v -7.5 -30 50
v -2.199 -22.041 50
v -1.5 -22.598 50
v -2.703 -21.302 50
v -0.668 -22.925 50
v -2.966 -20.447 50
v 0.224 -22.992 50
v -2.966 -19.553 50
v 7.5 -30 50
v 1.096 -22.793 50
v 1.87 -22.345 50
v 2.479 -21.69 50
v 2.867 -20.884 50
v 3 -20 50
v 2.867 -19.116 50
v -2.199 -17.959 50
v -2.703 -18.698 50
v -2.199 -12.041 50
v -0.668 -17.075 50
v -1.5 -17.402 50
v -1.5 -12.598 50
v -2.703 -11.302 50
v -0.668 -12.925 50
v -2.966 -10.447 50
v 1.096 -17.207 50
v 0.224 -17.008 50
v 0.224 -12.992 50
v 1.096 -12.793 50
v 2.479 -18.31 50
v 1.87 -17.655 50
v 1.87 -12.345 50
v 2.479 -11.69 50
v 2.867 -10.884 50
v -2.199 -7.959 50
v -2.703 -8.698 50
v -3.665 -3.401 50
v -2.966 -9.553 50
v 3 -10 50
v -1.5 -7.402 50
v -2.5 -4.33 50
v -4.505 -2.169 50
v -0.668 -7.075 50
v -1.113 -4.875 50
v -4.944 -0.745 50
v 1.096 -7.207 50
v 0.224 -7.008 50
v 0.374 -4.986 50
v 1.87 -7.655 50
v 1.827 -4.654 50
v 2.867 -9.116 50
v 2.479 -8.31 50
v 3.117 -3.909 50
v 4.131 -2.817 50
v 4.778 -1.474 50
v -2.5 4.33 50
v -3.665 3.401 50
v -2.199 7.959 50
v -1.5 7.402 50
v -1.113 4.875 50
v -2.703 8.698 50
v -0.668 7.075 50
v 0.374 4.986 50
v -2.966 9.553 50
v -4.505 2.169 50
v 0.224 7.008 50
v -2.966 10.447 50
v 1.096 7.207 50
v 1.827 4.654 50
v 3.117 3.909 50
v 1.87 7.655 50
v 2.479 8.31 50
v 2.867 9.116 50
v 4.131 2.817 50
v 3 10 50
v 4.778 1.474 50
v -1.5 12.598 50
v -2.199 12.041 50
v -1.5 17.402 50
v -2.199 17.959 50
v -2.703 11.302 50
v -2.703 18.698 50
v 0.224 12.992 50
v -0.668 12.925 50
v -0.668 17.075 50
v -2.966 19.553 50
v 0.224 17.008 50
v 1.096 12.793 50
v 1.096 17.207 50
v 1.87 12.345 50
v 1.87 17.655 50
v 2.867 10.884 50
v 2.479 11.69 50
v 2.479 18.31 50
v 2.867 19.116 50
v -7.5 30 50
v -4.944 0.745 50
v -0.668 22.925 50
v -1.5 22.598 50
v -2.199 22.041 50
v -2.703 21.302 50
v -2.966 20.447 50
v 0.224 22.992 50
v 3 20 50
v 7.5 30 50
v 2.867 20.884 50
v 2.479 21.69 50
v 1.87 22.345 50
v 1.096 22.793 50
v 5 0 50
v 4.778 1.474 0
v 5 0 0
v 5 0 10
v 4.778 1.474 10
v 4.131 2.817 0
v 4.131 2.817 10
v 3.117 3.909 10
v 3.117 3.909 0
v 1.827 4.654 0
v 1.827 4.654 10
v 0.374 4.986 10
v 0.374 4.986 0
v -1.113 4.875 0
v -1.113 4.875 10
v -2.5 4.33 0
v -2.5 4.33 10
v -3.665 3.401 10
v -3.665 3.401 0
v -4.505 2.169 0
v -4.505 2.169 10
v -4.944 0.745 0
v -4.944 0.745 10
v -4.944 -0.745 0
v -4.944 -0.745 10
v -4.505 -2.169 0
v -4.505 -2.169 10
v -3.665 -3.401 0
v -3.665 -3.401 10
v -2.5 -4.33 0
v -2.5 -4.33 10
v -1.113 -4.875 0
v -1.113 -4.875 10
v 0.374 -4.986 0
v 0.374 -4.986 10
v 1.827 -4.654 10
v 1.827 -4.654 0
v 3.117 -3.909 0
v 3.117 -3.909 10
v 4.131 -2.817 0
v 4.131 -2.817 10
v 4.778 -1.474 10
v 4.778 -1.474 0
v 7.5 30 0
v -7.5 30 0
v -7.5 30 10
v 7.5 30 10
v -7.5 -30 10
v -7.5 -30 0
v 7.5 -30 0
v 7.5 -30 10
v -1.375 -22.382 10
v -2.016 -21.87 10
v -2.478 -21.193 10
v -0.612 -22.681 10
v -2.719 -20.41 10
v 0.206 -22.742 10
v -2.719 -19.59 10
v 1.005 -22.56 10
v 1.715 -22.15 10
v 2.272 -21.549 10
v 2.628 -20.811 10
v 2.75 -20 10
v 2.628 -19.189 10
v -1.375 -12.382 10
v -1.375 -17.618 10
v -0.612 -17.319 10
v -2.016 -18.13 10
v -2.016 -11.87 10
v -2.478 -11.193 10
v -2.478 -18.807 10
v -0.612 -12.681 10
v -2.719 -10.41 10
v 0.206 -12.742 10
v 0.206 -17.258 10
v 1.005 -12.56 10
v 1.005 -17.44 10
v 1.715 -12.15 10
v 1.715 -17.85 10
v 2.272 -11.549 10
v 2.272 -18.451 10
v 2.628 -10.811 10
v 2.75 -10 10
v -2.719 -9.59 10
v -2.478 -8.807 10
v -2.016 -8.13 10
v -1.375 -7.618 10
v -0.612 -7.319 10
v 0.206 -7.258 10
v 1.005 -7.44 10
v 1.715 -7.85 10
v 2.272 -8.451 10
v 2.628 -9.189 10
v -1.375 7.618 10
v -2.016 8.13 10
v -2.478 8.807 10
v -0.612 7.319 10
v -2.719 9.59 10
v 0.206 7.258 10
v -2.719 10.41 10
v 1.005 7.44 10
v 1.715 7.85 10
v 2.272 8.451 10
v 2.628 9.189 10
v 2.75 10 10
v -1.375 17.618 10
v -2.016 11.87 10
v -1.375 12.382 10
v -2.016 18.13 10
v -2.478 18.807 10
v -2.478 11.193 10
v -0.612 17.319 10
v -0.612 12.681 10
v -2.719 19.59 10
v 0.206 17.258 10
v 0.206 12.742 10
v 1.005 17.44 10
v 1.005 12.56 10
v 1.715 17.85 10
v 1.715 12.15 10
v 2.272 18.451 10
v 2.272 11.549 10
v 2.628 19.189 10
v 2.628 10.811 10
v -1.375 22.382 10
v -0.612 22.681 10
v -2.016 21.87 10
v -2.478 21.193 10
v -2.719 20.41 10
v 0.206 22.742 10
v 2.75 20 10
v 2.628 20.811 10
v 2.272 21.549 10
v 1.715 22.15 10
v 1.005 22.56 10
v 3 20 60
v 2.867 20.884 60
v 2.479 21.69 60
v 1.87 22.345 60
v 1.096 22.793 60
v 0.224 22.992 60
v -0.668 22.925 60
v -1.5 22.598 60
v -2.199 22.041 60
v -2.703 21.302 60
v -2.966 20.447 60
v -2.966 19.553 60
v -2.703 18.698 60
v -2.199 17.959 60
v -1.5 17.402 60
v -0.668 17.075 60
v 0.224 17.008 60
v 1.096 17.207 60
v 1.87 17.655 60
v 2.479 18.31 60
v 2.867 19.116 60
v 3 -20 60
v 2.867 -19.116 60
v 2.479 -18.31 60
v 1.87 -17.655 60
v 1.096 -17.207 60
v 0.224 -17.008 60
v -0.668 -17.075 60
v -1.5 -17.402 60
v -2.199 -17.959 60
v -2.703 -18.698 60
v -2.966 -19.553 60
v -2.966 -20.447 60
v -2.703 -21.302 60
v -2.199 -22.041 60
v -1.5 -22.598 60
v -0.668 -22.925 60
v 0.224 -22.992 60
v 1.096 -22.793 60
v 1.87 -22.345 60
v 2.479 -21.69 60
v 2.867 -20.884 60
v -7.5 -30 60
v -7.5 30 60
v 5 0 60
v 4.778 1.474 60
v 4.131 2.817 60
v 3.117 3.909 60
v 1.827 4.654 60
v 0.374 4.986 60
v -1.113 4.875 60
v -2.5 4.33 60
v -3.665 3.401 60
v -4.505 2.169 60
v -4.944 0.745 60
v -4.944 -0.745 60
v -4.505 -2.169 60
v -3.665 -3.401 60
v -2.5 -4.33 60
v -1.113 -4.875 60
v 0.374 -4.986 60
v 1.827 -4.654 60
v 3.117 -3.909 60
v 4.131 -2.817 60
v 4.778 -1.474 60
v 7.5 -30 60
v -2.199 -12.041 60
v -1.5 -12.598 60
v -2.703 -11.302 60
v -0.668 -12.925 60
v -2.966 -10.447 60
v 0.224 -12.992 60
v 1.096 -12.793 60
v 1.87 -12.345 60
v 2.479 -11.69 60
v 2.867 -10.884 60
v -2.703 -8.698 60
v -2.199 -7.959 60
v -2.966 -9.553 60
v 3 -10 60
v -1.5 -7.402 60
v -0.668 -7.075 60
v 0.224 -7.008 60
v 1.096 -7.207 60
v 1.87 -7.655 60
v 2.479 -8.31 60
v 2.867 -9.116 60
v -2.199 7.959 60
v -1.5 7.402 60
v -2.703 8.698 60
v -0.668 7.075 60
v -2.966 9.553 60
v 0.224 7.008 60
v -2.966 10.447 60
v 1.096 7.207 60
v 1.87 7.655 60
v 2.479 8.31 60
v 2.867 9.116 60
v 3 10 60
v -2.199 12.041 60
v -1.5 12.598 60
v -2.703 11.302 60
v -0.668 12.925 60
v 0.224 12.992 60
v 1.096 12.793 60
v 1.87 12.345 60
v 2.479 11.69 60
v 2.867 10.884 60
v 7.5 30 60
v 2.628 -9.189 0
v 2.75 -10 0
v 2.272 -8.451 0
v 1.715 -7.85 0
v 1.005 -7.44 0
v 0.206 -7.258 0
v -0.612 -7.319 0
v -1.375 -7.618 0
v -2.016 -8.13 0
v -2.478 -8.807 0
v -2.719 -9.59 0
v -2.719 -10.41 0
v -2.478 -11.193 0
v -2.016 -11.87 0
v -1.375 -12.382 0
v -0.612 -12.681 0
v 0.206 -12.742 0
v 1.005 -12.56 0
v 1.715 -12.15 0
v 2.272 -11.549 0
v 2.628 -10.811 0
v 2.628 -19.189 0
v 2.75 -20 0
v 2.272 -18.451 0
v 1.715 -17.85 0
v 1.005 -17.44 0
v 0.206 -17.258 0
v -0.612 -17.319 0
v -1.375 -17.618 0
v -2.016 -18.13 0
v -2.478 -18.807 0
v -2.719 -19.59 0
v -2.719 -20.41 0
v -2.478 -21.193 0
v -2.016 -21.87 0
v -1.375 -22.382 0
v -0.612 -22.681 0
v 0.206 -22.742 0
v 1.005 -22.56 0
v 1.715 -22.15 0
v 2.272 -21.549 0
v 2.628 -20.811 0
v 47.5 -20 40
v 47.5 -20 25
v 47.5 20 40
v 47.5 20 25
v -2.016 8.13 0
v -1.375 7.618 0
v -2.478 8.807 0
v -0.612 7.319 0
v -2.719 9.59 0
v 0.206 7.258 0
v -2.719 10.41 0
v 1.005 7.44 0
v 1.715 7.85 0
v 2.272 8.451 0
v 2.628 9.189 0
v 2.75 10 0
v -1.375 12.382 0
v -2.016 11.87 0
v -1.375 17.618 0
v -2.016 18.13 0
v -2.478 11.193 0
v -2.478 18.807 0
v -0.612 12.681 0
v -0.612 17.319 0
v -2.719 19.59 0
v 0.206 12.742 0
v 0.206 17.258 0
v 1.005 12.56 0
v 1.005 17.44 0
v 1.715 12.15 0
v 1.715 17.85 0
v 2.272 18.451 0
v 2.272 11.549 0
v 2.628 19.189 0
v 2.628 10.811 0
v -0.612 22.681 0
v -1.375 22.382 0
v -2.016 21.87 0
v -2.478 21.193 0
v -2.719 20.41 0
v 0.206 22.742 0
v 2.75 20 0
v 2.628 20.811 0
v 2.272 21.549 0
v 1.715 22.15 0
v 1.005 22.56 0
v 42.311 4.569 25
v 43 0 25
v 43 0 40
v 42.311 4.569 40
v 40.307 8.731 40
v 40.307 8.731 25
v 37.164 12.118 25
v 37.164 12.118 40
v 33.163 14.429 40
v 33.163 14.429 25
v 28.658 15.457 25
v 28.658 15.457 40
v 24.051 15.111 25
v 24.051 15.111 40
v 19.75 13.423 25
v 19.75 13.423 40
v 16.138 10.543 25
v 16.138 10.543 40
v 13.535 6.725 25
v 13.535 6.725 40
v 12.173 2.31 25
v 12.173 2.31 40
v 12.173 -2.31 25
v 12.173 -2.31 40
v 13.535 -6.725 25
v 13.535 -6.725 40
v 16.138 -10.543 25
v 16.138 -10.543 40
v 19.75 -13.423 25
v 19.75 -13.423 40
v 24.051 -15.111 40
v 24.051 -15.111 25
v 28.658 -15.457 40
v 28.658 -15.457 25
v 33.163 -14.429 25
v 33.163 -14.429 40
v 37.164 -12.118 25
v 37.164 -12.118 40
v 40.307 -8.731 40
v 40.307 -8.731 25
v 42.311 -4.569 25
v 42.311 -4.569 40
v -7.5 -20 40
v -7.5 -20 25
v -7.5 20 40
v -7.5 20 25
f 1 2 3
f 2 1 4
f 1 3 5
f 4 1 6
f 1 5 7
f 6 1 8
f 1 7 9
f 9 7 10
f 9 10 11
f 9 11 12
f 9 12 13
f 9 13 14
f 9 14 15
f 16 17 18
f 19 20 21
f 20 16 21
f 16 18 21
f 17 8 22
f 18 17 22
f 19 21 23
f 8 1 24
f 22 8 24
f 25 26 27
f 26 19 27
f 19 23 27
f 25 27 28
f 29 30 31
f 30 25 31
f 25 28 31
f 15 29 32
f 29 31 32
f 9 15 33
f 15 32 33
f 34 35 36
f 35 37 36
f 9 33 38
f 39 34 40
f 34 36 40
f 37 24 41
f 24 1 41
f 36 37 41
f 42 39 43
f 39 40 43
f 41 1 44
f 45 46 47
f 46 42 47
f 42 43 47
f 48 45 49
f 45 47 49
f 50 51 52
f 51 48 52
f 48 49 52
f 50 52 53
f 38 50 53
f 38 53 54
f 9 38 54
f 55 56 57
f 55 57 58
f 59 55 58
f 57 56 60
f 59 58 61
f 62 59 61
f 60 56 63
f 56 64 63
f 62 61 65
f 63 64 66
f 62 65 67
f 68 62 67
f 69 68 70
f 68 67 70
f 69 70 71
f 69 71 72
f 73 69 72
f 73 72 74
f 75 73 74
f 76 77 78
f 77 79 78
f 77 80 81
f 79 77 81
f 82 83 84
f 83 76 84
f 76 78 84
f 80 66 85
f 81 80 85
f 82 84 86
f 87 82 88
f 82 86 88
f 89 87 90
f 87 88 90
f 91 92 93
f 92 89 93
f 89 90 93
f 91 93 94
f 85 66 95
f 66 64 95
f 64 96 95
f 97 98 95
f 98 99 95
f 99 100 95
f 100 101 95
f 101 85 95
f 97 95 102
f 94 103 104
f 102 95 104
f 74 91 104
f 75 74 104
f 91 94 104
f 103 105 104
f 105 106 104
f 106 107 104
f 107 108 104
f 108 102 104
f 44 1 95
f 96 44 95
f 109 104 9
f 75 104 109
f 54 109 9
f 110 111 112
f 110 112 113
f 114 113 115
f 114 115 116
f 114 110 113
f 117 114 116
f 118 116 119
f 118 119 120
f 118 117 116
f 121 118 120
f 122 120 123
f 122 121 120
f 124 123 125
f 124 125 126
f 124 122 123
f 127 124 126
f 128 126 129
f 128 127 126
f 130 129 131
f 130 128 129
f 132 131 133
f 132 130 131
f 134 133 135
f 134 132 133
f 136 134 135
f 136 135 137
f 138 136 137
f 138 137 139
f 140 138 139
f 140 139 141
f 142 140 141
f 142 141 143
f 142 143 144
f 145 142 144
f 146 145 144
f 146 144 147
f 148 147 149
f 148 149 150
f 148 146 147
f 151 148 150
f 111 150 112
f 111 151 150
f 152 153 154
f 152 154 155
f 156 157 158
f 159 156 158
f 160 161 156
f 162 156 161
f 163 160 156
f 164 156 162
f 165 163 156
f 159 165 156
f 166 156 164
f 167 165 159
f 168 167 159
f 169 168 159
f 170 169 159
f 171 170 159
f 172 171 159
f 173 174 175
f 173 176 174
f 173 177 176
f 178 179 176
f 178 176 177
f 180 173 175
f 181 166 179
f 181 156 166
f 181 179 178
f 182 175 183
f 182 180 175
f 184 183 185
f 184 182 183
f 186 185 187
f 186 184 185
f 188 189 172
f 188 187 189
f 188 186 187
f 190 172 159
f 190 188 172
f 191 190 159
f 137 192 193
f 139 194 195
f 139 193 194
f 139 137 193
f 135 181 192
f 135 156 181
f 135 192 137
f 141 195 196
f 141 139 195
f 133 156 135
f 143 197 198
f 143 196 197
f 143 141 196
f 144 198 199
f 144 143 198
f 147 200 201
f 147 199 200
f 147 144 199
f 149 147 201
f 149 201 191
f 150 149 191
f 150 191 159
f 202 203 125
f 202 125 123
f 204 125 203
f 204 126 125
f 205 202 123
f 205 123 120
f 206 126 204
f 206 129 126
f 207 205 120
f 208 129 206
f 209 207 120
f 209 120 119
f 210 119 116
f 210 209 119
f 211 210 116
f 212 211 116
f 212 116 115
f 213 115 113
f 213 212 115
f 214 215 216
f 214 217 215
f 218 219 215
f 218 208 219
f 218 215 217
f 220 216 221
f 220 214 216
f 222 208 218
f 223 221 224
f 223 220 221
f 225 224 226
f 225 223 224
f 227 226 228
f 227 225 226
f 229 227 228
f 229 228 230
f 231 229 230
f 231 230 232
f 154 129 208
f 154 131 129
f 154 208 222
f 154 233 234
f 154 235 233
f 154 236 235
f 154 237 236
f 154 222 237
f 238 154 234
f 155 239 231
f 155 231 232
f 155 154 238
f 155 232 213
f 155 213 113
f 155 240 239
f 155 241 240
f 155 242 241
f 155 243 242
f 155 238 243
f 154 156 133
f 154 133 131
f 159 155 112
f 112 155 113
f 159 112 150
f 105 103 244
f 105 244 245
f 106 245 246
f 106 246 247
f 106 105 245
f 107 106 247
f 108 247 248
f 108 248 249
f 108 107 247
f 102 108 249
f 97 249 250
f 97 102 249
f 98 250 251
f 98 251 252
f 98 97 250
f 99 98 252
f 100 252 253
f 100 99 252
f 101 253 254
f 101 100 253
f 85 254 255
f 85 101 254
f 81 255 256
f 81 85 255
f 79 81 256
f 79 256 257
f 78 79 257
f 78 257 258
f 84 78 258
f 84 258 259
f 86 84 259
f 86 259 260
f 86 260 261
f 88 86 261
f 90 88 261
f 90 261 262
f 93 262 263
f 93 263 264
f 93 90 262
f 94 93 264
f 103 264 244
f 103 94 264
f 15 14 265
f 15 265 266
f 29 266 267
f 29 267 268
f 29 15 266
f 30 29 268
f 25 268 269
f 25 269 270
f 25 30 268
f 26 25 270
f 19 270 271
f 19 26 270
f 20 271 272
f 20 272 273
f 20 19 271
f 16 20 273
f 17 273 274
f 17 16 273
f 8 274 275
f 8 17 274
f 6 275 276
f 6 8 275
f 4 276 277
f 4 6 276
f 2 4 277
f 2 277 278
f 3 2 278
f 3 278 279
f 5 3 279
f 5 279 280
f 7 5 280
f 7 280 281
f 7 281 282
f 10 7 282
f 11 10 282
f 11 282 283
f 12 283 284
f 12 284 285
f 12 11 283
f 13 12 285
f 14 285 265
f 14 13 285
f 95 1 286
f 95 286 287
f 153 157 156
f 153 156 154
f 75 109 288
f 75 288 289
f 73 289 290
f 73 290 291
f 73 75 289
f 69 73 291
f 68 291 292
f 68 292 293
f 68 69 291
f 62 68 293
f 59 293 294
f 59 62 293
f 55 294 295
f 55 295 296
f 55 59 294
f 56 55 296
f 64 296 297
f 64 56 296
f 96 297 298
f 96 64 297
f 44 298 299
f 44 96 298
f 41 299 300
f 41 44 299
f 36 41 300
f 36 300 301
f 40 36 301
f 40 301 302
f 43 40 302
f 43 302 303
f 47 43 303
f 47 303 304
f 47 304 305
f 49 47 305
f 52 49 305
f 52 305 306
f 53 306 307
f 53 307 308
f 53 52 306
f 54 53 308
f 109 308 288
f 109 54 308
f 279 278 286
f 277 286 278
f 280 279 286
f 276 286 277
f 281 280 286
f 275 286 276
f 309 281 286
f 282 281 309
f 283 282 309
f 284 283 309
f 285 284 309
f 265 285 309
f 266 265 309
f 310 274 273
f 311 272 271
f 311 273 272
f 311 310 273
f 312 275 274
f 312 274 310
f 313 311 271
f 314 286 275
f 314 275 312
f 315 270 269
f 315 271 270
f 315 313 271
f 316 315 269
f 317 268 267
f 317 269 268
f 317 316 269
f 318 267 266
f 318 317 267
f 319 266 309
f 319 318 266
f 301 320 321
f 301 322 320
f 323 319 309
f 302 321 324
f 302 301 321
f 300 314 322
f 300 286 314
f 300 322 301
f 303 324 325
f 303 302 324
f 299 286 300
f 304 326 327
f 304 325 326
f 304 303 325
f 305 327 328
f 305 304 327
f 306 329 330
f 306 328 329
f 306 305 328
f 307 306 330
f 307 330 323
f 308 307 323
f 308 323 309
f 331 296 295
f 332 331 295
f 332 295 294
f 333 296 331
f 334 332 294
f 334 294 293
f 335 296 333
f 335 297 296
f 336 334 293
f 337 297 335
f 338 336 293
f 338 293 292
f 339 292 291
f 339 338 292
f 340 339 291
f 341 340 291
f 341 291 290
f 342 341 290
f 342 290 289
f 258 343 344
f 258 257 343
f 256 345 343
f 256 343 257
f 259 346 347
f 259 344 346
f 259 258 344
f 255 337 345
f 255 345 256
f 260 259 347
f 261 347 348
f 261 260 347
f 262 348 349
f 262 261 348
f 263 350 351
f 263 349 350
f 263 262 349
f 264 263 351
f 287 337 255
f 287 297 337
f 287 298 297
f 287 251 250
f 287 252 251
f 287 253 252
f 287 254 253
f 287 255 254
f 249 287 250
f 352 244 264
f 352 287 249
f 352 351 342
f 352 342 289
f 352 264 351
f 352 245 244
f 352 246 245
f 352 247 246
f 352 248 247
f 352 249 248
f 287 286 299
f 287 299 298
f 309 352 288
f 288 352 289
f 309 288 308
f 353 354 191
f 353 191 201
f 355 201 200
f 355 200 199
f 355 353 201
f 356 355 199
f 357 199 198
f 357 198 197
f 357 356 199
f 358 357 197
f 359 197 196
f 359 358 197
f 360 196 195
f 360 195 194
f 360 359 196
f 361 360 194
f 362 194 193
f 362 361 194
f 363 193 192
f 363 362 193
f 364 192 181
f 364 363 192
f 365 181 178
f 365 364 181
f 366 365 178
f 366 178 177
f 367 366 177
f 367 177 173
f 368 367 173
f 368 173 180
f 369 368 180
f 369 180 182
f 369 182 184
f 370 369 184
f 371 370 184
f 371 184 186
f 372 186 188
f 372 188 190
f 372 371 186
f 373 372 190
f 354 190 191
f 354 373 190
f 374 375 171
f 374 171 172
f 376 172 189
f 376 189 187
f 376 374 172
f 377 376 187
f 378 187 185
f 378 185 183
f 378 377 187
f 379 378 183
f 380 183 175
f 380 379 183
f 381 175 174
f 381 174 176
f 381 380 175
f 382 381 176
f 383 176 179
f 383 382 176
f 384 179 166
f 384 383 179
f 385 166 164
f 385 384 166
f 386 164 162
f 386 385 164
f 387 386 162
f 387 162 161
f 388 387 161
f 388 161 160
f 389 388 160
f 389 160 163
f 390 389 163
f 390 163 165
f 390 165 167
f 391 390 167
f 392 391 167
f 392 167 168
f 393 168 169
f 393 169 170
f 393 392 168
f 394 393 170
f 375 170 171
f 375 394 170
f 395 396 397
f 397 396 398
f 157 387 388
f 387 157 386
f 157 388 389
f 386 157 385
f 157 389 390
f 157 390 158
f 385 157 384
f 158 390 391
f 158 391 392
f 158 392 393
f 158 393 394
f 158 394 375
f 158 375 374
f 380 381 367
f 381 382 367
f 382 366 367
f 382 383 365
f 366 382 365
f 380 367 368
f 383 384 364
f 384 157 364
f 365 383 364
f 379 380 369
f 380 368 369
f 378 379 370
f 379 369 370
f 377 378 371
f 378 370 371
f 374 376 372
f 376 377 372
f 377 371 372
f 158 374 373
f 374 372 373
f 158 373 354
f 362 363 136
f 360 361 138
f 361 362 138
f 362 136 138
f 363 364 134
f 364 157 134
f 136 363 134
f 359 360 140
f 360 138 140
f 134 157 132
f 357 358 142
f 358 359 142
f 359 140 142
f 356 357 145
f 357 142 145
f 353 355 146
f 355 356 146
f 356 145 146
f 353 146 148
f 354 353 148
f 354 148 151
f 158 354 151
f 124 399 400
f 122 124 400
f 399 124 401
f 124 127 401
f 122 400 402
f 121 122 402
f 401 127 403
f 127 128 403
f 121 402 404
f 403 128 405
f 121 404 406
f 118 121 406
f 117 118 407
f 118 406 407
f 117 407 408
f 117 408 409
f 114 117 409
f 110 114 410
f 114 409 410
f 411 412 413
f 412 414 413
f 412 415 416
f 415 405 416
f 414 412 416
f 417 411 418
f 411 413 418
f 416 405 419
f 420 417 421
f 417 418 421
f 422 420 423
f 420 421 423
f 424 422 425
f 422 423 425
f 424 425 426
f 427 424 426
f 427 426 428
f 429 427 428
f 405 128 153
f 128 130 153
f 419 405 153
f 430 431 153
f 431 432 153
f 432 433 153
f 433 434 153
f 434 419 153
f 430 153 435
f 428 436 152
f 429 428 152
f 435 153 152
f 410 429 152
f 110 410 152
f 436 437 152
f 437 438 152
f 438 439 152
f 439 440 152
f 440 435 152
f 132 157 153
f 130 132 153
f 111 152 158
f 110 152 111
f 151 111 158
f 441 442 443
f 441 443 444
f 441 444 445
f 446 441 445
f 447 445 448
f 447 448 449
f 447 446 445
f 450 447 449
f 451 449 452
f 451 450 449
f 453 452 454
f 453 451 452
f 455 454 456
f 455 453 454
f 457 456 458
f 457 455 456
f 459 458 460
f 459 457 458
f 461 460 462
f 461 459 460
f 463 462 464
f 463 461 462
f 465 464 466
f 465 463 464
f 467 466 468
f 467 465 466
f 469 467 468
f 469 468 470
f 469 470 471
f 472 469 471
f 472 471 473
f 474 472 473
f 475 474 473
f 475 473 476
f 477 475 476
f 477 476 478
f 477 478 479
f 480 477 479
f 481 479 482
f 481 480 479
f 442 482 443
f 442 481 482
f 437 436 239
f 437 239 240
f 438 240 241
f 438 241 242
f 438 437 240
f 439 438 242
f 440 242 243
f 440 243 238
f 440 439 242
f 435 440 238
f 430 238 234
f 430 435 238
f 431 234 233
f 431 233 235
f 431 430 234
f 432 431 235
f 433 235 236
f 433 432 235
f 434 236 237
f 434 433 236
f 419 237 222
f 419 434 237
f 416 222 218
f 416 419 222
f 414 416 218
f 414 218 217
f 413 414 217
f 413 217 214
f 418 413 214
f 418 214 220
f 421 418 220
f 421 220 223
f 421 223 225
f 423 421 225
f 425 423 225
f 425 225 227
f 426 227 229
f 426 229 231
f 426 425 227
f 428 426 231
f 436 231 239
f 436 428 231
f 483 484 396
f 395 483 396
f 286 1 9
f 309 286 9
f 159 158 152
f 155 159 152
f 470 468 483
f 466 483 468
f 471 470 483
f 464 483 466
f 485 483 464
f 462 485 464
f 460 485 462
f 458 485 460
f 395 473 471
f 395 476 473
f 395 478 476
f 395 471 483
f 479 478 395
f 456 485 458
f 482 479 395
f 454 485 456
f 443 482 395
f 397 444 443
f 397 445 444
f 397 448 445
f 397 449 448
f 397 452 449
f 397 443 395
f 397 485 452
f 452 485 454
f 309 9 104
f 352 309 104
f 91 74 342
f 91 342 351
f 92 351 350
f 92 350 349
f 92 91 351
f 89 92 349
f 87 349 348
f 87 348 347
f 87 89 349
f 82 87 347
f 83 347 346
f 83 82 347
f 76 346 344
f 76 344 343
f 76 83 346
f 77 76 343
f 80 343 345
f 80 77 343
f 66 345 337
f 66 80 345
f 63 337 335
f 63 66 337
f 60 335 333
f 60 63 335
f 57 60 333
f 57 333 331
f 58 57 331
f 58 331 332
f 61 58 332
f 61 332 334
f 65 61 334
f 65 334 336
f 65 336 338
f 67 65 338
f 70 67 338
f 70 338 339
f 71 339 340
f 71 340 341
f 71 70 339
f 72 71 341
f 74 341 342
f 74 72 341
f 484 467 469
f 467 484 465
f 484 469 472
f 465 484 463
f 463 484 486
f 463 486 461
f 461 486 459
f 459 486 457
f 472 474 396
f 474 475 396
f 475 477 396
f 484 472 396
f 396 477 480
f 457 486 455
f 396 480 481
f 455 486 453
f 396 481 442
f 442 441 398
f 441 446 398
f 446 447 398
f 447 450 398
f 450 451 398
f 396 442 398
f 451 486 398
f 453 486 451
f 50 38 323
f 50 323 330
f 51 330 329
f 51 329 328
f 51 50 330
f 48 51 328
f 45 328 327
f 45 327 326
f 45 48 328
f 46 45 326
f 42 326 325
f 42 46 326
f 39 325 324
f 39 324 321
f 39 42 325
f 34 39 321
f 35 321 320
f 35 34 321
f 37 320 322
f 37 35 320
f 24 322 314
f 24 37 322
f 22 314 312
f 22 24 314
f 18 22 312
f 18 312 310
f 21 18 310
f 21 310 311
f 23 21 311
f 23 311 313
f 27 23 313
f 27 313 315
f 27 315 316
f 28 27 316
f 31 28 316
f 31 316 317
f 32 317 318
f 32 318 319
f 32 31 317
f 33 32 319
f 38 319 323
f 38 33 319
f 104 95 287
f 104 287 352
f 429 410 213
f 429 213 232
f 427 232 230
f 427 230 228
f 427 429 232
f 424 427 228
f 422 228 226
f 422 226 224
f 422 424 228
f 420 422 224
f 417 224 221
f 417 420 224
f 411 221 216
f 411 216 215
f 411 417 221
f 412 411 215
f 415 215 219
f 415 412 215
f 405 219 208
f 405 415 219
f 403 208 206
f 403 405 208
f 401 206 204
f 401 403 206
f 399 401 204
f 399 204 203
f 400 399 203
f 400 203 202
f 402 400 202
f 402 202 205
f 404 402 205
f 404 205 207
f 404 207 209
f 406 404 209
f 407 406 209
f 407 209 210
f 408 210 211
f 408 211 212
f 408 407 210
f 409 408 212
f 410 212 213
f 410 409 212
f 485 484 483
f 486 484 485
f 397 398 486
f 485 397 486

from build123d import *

# Parameters (mm, degrees)
F0_W     = 15
F0_H     = 60
F0_R     = 2.75
F0_R_2   = 5
F5_DEPTH = 10
F3_W     = 15
F3_H     = 60
F3_R     = 3
F3_R_2   = 5
F6_DEPTH = 10
F4_W     = 15
F4_H     = 40
F4_W_2   = 40
F4_R     = 15.5
F7_DEPTH = 15


with BuildPart() as f5:
    # F0 (on Top) → F5 (new body)
    with BuildSketch(Plane.XY):
        Rectangle(F0_W, F0_H)
        with Locations((0, -20)):
            Circle(F0_R, mode=Mode.SUBTRACT)
        with Locations((0, -10)):
            Circle(F0_R, mode=Mode.SUBTRACT)
        Circle(F0_R_2, mode=Mode.SUBTRACT)
        with Locations((0, 10)):
            Circle(F0_R, mode=Mode.SUBTRACT)
        with Locations((0, 20)):
            Circle(F0_R, mode=Mode.SUBTRACT)
    extrude(amount=F5_DEPTH)


with BuildPart() as f6:
    # F3 (on offset) → F6 (new body)
    with BuildSketch(Plane.XY.offset(50)):
        Rectangle(F3_W, F3_H)
        with Locations((0, -20)):
            Circle(F3_R, mode=Mode.SUBTRACT)
        with Locations((0, -10)):
            Circle(F3_R, mode=Mode.SUBTRACT)
        Circle(F3_R_2, mode=Mode.SUBTRACT)
        with Locations((0, 10)):
            Circle(F3_R, mode=Mode.SUBTRACT)
        with Locations((0, 20)):
            Circle(F3_R, mode=Mode.SUBTRACT)
    extrude(amount=F6_DEPTH)


with BuildPart() as f7:
    # F4 (on offset) → F7 (new body)
    with BuildSketch(Plane.XY.offset(25)):
        Rectangle(F4_W, F4_H)
        with Locations((27.5, 0)):
            Rectangle(F4_W_2, F4_H)
        with Locations((27.5, 0)):
            Circle(F4_R, mode=Mode.SUBTRACT)
    extrude(amount=F7_DEPTH)


solid = Compound([f5.part, f6.part, f7.part])
